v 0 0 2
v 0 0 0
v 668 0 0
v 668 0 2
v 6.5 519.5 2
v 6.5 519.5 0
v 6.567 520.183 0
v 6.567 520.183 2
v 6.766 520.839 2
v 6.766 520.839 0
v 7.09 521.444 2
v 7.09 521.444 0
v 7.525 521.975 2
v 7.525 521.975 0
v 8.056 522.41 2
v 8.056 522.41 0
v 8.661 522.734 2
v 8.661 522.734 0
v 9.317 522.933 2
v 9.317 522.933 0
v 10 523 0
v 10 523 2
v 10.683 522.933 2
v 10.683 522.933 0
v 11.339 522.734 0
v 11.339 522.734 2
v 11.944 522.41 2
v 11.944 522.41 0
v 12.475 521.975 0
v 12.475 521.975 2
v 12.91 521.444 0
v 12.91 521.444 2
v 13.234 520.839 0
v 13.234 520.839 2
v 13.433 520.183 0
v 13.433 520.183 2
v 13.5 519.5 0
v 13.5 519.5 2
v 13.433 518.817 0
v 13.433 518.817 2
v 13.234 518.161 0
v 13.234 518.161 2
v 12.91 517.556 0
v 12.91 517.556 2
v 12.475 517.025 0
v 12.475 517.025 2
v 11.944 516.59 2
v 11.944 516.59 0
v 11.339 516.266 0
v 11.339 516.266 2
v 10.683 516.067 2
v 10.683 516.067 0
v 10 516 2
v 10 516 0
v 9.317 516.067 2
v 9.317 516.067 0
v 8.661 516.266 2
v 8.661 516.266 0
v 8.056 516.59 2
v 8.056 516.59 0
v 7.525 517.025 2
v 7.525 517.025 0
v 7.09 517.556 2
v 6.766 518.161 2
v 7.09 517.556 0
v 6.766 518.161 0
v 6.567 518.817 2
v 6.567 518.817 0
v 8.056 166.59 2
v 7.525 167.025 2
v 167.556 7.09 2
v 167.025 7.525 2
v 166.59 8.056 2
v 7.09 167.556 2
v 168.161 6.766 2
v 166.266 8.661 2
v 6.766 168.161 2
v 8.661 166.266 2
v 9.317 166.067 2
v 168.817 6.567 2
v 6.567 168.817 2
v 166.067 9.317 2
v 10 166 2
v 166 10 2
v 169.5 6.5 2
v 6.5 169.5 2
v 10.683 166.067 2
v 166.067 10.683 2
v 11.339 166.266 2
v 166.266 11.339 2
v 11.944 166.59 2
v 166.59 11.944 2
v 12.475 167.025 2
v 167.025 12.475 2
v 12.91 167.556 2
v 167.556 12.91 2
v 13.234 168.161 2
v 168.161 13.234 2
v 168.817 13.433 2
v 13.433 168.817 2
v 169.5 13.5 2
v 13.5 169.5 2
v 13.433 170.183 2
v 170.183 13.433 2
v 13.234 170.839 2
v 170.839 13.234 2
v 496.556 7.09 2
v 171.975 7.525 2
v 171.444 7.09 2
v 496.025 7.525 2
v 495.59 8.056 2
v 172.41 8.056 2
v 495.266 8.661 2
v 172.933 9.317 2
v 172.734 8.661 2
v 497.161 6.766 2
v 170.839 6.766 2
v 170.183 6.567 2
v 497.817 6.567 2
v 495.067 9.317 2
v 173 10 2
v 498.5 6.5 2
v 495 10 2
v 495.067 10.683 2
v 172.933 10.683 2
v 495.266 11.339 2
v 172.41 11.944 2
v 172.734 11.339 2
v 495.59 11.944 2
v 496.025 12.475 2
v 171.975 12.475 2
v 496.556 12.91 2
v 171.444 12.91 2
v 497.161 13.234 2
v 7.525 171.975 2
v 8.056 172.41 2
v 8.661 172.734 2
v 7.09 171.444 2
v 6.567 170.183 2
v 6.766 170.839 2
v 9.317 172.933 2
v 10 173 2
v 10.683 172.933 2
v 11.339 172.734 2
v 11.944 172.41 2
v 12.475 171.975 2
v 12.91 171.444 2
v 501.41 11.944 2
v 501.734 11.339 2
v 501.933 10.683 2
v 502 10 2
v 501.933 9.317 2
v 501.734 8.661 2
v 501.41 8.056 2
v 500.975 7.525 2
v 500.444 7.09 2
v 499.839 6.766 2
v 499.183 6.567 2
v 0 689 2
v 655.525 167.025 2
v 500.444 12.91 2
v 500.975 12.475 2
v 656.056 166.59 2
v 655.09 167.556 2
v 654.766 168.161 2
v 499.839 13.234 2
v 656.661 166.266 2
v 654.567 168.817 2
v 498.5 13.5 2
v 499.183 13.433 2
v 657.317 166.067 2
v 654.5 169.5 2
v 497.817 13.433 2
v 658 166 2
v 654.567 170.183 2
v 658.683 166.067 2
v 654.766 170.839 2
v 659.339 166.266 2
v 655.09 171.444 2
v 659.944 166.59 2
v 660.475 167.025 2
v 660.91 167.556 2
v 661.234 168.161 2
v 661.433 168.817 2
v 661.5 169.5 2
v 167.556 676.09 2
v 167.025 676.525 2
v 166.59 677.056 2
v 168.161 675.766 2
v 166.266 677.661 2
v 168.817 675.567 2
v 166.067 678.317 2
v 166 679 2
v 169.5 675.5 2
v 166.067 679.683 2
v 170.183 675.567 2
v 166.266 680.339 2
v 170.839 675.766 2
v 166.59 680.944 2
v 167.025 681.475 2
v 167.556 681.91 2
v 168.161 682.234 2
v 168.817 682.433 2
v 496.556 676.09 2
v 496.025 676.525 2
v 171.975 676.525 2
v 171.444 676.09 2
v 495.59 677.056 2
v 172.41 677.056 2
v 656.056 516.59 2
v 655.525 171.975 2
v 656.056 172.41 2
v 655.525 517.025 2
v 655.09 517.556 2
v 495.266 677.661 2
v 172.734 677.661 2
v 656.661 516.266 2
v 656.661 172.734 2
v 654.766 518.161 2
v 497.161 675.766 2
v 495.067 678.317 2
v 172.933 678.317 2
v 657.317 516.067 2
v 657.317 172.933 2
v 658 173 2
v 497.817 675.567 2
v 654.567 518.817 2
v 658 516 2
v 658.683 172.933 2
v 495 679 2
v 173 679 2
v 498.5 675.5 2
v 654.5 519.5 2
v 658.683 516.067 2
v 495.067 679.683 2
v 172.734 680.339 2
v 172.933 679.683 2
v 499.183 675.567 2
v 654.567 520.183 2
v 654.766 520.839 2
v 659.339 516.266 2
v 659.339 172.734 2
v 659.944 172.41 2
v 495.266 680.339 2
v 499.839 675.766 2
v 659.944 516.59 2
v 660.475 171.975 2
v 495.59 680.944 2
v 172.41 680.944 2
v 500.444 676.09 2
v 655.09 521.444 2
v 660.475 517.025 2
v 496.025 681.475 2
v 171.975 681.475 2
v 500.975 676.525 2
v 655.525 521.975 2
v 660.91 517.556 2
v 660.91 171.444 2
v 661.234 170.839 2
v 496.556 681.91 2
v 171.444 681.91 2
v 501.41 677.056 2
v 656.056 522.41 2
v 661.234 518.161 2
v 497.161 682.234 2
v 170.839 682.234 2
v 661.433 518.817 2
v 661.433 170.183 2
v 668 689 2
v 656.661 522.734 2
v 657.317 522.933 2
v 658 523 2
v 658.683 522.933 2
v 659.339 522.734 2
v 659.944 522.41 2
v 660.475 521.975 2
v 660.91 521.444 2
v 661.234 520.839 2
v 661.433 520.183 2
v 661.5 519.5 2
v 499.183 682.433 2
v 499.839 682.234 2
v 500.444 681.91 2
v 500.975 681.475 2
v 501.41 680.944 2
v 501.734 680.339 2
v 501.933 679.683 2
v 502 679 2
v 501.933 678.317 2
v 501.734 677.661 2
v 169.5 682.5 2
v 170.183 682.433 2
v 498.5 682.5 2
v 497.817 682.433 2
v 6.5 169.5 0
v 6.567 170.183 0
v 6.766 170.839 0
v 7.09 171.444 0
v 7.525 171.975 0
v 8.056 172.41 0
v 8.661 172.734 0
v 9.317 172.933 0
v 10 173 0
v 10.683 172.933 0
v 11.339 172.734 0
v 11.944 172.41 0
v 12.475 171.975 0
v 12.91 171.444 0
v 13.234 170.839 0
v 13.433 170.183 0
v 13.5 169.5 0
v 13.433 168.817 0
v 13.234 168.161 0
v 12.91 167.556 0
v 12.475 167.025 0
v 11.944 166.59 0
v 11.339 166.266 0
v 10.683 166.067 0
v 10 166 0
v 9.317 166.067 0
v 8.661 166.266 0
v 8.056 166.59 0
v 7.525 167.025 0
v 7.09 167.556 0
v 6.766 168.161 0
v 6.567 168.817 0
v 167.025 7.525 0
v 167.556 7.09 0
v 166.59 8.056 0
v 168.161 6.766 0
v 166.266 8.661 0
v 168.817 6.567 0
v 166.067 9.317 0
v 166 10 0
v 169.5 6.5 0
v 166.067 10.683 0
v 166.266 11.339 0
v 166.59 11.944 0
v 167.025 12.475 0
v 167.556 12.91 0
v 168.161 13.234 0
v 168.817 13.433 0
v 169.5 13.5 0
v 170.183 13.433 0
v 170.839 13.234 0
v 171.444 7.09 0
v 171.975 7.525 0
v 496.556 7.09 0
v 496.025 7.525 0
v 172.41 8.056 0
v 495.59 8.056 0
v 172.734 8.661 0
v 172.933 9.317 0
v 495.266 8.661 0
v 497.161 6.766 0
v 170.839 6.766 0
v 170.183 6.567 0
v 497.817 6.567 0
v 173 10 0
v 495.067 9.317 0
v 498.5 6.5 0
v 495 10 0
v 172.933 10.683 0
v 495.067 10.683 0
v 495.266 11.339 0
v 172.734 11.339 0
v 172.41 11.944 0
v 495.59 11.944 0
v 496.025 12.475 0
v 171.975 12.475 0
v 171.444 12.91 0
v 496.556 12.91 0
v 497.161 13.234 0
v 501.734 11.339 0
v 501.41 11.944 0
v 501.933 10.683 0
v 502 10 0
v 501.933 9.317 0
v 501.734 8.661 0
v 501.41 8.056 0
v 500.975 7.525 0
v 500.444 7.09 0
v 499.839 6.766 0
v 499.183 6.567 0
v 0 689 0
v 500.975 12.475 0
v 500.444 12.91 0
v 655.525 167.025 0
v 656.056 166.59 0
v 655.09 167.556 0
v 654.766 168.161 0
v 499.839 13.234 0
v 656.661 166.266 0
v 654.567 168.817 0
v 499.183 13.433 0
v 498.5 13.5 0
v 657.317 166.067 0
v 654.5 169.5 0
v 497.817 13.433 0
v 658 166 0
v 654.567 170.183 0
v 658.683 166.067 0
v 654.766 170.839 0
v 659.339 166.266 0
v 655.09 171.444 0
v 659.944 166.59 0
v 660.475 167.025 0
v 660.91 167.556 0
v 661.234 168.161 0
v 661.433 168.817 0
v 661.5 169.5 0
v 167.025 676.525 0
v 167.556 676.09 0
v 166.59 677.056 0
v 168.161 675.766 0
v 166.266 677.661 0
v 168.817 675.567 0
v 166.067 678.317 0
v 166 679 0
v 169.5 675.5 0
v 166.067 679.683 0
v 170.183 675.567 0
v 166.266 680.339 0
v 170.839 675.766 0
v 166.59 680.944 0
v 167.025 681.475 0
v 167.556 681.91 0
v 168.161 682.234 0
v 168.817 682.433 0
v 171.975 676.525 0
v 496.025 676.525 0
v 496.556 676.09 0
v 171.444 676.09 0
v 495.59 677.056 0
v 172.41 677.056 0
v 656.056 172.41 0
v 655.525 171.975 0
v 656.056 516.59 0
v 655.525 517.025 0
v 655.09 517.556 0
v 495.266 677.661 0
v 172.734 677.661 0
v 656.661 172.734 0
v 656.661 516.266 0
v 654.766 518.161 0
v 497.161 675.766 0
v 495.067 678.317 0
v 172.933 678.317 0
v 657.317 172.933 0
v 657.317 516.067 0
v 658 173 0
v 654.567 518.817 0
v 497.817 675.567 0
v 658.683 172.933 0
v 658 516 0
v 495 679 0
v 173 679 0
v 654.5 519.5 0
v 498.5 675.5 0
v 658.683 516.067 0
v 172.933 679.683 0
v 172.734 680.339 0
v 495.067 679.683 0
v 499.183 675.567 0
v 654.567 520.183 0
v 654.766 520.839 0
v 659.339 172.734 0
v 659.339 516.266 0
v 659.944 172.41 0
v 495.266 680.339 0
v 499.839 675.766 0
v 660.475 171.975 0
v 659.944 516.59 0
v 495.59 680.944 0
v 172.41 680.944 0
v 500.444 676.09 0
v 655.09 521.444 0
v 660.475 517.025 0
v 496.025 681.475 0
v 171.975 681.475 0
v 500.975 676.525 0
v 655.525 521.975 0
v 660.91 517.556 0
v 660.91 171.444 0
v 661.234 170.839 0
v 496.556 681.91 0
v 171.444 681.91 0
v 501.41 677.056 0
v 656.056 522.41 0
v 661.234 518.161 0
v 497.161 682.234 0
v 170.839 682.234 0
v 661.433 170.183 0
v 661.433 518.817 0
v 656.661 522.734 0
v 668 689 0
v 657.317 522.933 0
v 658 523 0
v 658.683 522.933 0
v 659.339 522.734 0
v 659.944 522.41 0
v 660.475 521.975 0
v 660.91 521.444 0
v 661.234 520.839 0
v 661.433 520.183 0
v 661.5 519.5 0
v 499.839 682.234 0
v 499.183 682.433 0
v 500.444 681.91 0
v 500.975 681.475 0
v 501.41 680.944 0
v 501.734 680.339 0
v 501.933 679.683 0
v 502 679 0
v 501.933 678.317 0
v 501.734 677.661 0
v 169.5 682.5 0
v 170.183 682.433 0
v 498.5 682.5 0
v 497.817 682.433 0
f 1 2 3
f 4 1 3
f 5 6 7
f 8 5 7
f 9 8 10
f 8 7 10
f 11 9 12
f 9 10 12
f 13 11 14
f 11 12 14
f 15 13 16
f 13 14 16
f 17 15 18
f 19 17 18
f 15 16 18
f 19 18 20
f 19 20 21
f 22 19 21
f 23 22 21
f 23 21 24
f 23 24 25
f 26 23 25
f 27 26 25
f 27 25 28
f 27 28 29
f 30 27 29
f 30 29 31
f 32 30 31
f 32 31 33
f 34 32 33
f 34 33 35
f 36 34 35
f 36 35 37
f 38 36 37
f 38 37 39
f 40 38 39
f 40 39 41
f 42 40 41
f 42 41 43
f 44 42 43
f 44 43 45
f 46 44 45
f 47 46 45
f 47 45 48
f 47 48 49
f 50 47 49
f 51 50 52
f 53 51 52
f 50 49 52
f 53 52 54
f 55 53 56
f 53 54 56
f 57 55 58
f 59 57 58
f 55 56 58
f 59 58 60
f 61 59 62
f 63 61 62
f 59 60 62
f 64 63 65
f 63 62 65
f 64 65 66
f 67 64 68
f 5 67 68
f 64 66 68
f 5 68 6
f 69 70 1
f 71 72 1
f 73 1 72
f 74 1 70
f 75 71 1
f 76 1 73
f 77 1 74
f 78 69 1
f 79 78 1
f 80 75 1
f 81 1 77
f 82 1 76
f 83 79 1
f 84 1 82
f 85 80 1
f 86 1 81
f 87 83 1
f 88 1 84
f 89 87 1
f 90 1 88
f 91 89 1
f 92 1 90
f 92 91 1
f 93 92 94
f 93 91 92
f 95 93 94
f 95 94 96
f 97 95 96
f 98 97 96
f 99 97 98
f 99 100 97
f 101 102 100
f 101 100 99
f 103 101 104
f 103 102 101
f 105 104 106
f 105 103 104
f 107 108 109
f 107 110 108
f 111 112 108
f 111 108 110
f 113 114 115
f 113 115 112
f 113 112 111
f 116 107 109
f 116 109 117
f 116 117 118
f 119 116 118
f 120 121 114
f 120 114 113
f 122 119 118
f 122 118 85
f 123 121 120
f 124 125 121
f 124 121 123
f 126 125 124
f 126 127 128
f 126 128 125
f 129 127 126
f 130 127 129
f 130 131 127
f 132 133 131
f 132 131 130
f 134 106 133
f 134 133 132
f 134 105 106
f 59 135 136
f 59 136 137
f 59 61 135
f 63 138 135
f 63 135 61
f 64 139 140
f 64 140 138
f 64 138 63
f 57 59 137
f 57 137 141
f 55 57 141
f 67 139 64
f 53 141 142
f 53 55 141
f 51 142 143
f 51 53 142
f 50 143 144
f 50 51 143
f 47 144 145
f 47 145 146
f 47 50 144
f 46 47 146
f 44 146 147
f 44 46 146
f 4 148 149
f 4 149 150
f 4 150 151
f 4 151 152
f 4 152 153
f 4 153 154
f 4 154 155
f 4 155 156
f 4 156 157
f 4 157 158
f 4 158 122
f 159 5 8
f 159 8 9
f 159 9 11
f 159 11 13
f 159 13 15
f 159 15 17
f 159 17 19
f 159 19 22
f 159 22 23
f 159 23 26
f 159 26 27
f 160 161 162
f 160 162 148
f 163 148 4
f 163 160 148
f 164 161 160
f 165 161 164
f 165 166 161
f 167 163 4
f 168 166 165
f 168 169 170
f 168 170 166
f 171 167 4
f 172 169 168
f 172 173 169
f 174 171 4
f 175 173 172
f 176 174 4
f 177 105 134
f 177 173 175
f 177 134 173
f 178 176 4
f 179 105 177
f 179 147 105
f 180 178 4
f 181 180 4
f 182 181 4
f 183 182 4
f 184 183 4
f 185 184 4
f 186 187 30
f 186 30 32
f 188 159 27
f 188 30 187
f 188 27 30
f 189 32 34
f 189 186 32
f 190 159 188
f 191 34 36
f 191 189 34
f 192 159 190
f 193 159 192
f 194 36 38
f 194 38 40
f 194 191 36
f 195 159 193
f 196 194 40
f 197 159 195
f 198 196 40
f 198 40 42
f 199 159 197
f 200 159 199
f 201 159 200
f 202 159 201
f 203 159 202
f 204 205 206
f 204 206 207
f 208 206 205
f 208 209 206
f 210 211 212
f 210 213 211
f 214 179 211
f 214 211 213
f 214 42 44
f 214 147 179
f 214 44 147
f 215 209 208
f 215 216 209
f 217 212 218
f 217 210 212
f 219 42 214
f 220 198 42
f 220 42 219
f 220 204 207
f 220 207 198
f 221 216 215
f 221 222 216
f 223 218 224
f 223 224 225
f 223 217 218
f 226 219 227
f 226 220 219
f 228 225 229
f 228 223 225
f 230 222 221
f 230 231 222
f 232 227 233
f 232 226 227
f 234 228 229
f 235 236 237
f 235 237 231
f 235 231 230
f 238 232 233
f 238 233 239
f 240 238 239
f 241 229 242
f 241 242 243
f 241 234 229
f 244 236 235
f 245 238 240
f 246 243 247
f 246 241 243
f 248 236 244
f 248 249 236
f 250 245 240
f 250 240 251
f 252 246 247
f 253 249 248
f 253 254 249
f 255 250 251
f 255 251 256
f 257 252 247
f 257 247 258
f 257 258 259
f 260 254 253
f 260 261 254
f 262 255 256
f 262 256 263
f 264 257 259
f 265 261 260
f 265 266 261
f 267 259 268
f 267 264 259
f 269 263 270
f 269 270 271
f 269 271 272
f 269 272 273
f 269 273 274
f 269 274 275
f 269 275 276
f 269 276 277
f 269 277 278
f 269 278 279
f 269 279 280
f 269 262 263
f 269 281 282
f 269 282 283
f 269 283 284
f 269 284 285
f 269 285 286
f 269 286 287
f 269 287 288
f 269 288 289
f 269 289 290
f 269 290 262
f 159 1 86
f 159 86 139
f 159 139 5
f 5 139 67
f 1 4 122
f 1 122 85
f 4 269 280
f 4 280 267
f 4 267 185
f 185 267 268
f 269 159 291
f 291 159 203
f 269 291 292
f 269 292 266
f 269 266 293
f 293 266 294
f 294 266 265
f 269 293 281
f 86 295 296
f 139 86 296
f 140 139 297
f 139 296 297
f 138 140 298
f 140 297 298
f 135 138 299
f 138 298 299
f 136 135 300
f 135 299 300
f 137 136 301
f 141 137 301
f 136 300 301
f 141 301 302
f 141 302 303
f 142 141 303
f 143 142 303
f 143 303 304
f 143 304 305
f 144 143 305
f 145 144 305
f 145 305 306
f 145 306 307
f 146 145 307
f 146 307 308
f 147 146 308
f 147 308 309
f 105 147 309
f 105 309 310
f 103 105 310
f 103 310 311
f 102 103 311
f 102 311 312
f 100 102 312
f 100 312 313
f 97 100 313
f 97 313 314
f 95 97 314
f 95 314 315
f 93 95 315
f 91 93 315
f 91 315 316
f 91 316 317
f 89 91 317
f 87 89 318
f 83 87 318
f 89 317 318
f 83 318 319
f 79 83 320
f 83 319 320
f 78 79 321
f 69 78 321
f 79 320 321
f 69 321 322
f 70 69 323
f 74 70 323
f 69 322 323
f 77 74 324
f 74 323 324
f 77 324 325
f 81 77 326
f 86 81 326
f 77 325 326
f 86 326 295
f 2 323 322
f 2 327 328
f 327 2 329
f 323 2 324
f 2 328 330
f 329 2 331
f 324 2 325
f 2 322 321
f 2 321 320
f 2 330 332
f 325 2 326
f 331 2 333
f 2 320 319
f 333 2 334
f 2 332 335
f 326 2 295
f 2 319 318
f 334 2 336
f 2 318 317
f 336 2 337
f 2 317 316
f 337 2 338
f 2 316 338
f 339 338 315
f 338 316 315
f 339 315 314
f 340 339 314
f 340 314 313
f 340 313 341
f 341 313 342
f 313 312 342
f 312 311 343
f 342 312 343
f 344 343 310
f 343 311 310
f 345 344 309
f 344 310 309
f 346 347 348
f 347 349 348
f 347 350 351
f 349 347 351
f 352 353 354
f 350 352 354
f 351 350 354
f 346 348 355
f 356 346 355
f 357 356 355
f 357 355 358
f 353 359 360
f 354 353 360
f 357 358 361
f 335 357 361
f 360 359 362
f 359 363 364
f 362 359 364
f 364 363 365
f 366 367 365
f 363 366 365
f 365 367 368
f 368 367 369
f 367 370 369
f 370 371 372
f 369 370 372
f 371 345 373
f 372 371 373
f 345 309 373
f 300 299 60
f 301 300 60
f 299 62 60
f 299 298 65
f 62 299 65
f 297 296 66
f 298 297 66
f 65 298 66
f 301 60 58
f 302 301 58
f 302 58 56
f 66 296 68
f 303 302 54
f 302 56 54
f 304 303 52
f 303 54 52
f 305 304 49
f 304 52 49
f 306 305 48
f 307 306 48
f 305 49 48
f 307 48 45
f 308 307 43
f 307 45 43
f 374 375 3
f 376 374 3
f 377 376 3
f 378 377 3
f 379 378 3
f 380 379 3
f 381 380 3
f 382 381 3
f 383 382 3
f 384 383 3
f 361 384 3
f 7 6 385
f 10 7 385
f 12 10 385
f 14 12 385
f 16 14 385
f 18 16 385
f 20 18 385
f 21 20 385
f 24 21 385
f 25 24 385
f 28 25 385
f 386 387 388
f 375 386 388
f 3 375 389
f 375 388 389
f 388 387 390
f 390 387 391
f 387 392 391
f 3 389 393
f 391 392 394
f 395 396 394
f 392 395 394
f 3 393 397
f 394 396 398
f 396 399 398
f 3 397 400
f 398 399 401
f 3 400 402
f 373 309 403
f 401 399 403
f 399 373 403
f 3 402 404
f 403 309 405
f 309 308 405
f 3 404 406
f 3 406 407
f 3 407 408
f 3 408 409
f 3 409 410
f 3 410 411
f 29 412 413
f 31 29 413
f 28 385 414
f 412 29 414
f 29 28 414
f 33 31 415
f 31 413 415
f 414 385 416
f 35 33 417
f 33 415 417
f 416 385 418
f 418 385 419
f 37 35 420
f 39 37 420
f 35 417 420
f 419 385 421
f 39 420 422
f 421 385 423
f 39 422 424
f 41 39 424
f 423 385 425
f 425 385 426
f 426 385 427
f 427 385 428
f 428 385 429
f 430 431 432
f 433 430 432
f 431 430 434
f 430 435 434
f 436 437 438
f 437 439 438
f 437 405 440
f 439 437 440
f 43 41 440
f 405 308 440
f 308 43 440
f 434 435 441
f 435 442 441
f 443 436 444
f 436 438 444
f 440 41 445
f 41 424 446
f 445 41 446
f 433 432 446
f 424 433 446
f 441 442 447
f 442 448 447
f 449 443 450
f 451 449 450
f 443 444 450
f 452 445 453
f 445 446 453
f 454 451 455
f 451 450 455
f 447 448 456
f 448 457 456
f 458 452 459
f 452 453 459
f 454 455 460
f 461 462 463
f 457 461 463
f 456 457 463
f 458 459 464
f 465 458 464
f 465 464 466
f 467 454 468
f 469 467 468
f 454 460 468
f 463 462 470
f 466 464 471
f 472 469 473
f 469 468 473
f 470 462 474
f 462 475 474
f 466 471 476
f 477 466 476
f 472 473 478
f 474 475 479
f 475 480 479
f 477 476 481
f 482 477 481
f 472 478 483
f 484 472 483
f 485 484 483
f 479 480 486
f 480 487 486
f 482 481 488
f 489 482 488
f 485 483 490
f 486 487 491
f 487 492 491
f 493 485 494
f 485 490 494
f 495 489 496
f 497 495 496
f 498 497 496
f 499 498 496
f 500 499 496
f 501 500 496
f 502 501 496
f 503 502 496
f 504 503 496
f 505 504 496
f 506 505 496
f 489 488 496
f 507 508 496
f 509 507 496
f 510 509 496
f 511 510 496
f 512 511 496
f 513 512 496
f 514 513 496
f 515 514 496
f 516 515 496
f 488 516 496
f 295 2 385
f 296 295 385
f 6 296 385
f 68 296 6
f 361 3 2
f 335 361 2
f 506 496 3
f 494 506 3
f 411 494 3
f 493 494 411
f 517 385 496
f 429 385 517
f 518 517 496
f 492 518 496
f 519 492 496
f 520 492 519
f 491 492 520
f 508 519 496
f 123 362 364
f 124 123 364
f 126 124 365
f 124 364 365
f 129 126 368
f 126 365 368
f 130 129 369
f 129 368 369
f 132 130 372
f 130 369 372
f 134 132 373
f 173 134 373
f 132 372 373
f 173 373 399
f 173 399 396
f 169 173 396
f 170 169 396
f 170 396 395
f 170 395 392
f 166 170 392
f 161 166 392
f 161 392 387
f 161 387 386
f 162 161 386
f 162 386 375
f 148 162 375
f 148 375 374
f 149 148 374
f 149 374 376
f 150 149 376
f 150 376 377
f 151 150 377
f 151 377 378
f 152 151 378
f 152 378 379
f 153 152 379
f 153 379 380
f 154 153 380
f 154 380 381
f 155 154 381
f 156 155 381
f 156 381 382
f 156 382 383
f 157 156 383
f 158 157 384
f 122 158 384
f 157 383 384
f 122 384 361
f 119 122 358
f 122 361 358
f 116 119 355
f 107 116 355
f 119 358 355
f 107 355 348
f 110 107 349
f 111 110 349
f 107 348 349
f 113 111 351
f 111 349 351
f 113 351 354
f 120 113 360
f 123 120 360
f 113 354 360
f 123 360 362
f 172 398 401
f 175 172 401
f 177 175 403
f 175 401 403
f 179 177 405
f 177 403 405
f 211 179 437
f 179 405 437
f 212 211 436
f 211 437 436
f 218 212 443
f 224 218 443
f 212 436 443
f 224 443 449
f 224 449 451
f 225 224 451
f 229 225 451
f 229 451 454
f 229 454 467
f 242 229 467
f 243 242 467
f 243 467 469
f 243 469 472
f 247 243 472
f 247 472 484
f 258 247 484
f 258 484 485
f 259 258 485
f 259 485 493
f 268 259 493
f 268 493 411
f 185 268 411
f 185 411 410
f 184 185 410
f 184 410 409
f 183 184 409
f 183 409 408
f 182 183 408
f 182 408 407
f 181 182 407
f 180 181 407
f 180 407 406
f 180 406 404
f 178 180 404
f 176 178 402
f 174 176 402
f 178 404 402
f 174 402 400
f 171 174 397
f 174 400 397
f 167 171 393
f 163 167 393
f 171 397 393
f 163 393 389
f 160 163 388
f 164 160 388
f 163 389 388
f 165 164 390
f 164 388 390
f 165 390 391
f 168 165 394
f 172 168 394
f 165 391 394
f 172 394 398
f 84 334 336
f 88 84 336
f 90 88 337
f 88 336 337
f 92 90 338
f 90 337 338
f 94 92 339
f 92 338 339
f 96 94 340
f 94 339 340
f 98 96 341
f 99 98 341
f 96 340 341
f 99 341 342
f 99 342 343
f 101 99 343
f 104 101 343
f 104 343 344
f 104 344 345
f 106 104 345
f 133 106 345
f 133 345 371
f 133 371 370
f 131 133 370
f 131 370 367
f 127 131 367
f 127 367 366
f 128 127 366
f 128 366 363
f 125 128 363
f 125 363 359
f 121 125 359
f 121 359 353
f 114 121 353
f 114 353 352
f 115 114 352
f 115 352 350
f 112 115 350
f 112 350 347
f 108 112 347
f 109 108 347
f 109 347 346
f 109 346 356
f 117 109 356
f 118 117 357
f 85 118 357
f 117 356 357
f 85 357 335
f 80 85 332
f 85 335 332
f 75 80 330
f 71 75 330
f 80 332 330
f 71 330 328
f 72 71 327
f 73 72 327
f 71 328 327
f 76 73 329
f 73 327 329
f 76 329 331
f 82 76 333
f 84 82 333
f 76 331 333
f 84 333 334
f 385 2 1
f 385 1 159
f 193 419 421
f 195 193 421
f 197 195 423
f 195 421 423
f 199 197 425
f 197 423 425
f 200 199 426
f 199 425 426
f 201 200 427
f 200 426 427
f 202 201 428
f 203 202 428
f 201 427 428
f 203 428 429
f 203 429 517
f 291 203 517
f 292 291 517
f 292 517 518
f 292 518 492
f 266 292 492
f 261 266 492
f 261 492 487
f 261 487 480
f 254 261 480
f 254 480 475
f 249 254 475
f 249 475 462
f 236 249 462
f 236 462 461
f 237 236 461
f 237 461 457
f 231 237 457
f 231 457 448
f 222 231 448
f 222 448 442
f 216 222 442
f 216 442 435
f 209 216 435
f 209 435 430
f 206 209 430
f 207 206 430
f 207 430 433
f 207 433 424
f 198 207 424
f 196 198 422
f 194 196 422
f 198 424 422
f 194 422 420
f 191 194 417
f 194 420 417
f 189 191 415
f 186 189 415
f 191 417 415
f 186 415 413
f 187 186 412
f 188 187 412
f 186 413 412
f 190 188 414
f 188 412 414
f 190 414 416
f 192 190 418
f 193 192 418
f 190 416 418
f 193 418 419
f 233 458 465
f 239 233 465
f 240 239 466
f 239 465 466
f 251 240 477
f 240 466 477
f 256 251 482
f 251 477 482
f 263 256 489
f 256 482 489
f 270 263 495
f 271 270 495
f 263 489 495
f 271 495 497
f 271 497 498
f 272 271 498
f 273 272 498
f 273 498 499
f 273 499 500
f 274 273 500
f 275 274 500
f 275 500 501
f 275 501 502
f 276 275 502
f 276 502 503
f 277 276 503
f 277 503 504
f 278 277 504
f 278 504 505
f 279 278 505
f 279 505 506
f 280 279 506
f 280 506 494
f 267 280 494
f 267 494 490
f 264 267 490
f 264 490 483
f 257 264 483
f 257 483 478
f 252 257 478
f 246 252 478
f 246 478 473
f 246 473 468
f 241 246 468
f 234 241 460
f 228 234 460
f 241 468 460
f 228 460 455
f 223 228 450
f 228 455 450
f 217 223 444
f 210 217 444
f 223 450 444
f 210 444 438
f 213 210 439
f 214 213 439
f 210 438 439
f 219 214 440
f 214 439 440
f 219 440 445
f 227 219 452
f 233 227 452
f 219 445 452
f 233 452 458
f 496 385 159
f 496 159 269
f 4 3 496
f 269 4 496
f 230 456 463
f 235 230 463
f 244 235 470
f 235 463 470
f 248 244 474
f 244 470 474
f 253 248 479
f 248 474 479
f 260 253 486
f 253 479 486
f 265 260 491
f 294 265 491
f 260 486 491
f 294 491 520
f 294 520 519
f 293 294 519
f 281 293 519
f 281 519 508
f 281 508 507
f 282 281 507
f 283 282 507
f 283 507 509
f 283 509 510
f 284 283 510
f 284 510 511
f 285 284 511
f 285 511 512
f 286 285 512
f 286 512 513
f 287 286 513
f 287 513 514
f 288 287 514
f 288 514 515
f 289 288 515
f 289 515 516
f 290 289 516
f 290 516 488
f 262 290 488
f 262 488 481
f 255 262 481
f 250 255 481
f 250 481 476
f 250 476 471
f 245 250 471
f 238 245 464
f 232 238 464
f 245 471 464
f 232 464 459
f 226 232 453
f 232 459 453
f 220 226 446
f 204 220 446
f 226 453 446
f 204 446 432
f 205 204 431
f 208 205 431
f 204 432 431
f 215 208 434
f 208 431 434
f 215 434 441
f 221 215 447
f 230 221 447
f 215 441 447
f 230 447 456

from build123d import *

# Parameters (mm, degrees)
F0_W     = 668
F0_H     = 689
F1_DEPTH = 2
F3_D     = 7


with BuildPart() as f1:
    # F0 (on Top) → F1 (new body)
    with BuildSketch(Plane.XY):
        with Locations((334, 344.5)):
            Rectangle(F0_W, F0_H)
    extrude(amount=F1_DEPTH)

    # F3 (through all)
    with Locations(Plane.XY.offset(2)):
        with Locations((10, 519.5), (169.5, 679), (498.5, 679), (658, 519.5), (658, 169.5), (498.5, 10), (169.5, 10), (10, 169.5)):
            Hole(F3_D / 2)


solid = f1.part
